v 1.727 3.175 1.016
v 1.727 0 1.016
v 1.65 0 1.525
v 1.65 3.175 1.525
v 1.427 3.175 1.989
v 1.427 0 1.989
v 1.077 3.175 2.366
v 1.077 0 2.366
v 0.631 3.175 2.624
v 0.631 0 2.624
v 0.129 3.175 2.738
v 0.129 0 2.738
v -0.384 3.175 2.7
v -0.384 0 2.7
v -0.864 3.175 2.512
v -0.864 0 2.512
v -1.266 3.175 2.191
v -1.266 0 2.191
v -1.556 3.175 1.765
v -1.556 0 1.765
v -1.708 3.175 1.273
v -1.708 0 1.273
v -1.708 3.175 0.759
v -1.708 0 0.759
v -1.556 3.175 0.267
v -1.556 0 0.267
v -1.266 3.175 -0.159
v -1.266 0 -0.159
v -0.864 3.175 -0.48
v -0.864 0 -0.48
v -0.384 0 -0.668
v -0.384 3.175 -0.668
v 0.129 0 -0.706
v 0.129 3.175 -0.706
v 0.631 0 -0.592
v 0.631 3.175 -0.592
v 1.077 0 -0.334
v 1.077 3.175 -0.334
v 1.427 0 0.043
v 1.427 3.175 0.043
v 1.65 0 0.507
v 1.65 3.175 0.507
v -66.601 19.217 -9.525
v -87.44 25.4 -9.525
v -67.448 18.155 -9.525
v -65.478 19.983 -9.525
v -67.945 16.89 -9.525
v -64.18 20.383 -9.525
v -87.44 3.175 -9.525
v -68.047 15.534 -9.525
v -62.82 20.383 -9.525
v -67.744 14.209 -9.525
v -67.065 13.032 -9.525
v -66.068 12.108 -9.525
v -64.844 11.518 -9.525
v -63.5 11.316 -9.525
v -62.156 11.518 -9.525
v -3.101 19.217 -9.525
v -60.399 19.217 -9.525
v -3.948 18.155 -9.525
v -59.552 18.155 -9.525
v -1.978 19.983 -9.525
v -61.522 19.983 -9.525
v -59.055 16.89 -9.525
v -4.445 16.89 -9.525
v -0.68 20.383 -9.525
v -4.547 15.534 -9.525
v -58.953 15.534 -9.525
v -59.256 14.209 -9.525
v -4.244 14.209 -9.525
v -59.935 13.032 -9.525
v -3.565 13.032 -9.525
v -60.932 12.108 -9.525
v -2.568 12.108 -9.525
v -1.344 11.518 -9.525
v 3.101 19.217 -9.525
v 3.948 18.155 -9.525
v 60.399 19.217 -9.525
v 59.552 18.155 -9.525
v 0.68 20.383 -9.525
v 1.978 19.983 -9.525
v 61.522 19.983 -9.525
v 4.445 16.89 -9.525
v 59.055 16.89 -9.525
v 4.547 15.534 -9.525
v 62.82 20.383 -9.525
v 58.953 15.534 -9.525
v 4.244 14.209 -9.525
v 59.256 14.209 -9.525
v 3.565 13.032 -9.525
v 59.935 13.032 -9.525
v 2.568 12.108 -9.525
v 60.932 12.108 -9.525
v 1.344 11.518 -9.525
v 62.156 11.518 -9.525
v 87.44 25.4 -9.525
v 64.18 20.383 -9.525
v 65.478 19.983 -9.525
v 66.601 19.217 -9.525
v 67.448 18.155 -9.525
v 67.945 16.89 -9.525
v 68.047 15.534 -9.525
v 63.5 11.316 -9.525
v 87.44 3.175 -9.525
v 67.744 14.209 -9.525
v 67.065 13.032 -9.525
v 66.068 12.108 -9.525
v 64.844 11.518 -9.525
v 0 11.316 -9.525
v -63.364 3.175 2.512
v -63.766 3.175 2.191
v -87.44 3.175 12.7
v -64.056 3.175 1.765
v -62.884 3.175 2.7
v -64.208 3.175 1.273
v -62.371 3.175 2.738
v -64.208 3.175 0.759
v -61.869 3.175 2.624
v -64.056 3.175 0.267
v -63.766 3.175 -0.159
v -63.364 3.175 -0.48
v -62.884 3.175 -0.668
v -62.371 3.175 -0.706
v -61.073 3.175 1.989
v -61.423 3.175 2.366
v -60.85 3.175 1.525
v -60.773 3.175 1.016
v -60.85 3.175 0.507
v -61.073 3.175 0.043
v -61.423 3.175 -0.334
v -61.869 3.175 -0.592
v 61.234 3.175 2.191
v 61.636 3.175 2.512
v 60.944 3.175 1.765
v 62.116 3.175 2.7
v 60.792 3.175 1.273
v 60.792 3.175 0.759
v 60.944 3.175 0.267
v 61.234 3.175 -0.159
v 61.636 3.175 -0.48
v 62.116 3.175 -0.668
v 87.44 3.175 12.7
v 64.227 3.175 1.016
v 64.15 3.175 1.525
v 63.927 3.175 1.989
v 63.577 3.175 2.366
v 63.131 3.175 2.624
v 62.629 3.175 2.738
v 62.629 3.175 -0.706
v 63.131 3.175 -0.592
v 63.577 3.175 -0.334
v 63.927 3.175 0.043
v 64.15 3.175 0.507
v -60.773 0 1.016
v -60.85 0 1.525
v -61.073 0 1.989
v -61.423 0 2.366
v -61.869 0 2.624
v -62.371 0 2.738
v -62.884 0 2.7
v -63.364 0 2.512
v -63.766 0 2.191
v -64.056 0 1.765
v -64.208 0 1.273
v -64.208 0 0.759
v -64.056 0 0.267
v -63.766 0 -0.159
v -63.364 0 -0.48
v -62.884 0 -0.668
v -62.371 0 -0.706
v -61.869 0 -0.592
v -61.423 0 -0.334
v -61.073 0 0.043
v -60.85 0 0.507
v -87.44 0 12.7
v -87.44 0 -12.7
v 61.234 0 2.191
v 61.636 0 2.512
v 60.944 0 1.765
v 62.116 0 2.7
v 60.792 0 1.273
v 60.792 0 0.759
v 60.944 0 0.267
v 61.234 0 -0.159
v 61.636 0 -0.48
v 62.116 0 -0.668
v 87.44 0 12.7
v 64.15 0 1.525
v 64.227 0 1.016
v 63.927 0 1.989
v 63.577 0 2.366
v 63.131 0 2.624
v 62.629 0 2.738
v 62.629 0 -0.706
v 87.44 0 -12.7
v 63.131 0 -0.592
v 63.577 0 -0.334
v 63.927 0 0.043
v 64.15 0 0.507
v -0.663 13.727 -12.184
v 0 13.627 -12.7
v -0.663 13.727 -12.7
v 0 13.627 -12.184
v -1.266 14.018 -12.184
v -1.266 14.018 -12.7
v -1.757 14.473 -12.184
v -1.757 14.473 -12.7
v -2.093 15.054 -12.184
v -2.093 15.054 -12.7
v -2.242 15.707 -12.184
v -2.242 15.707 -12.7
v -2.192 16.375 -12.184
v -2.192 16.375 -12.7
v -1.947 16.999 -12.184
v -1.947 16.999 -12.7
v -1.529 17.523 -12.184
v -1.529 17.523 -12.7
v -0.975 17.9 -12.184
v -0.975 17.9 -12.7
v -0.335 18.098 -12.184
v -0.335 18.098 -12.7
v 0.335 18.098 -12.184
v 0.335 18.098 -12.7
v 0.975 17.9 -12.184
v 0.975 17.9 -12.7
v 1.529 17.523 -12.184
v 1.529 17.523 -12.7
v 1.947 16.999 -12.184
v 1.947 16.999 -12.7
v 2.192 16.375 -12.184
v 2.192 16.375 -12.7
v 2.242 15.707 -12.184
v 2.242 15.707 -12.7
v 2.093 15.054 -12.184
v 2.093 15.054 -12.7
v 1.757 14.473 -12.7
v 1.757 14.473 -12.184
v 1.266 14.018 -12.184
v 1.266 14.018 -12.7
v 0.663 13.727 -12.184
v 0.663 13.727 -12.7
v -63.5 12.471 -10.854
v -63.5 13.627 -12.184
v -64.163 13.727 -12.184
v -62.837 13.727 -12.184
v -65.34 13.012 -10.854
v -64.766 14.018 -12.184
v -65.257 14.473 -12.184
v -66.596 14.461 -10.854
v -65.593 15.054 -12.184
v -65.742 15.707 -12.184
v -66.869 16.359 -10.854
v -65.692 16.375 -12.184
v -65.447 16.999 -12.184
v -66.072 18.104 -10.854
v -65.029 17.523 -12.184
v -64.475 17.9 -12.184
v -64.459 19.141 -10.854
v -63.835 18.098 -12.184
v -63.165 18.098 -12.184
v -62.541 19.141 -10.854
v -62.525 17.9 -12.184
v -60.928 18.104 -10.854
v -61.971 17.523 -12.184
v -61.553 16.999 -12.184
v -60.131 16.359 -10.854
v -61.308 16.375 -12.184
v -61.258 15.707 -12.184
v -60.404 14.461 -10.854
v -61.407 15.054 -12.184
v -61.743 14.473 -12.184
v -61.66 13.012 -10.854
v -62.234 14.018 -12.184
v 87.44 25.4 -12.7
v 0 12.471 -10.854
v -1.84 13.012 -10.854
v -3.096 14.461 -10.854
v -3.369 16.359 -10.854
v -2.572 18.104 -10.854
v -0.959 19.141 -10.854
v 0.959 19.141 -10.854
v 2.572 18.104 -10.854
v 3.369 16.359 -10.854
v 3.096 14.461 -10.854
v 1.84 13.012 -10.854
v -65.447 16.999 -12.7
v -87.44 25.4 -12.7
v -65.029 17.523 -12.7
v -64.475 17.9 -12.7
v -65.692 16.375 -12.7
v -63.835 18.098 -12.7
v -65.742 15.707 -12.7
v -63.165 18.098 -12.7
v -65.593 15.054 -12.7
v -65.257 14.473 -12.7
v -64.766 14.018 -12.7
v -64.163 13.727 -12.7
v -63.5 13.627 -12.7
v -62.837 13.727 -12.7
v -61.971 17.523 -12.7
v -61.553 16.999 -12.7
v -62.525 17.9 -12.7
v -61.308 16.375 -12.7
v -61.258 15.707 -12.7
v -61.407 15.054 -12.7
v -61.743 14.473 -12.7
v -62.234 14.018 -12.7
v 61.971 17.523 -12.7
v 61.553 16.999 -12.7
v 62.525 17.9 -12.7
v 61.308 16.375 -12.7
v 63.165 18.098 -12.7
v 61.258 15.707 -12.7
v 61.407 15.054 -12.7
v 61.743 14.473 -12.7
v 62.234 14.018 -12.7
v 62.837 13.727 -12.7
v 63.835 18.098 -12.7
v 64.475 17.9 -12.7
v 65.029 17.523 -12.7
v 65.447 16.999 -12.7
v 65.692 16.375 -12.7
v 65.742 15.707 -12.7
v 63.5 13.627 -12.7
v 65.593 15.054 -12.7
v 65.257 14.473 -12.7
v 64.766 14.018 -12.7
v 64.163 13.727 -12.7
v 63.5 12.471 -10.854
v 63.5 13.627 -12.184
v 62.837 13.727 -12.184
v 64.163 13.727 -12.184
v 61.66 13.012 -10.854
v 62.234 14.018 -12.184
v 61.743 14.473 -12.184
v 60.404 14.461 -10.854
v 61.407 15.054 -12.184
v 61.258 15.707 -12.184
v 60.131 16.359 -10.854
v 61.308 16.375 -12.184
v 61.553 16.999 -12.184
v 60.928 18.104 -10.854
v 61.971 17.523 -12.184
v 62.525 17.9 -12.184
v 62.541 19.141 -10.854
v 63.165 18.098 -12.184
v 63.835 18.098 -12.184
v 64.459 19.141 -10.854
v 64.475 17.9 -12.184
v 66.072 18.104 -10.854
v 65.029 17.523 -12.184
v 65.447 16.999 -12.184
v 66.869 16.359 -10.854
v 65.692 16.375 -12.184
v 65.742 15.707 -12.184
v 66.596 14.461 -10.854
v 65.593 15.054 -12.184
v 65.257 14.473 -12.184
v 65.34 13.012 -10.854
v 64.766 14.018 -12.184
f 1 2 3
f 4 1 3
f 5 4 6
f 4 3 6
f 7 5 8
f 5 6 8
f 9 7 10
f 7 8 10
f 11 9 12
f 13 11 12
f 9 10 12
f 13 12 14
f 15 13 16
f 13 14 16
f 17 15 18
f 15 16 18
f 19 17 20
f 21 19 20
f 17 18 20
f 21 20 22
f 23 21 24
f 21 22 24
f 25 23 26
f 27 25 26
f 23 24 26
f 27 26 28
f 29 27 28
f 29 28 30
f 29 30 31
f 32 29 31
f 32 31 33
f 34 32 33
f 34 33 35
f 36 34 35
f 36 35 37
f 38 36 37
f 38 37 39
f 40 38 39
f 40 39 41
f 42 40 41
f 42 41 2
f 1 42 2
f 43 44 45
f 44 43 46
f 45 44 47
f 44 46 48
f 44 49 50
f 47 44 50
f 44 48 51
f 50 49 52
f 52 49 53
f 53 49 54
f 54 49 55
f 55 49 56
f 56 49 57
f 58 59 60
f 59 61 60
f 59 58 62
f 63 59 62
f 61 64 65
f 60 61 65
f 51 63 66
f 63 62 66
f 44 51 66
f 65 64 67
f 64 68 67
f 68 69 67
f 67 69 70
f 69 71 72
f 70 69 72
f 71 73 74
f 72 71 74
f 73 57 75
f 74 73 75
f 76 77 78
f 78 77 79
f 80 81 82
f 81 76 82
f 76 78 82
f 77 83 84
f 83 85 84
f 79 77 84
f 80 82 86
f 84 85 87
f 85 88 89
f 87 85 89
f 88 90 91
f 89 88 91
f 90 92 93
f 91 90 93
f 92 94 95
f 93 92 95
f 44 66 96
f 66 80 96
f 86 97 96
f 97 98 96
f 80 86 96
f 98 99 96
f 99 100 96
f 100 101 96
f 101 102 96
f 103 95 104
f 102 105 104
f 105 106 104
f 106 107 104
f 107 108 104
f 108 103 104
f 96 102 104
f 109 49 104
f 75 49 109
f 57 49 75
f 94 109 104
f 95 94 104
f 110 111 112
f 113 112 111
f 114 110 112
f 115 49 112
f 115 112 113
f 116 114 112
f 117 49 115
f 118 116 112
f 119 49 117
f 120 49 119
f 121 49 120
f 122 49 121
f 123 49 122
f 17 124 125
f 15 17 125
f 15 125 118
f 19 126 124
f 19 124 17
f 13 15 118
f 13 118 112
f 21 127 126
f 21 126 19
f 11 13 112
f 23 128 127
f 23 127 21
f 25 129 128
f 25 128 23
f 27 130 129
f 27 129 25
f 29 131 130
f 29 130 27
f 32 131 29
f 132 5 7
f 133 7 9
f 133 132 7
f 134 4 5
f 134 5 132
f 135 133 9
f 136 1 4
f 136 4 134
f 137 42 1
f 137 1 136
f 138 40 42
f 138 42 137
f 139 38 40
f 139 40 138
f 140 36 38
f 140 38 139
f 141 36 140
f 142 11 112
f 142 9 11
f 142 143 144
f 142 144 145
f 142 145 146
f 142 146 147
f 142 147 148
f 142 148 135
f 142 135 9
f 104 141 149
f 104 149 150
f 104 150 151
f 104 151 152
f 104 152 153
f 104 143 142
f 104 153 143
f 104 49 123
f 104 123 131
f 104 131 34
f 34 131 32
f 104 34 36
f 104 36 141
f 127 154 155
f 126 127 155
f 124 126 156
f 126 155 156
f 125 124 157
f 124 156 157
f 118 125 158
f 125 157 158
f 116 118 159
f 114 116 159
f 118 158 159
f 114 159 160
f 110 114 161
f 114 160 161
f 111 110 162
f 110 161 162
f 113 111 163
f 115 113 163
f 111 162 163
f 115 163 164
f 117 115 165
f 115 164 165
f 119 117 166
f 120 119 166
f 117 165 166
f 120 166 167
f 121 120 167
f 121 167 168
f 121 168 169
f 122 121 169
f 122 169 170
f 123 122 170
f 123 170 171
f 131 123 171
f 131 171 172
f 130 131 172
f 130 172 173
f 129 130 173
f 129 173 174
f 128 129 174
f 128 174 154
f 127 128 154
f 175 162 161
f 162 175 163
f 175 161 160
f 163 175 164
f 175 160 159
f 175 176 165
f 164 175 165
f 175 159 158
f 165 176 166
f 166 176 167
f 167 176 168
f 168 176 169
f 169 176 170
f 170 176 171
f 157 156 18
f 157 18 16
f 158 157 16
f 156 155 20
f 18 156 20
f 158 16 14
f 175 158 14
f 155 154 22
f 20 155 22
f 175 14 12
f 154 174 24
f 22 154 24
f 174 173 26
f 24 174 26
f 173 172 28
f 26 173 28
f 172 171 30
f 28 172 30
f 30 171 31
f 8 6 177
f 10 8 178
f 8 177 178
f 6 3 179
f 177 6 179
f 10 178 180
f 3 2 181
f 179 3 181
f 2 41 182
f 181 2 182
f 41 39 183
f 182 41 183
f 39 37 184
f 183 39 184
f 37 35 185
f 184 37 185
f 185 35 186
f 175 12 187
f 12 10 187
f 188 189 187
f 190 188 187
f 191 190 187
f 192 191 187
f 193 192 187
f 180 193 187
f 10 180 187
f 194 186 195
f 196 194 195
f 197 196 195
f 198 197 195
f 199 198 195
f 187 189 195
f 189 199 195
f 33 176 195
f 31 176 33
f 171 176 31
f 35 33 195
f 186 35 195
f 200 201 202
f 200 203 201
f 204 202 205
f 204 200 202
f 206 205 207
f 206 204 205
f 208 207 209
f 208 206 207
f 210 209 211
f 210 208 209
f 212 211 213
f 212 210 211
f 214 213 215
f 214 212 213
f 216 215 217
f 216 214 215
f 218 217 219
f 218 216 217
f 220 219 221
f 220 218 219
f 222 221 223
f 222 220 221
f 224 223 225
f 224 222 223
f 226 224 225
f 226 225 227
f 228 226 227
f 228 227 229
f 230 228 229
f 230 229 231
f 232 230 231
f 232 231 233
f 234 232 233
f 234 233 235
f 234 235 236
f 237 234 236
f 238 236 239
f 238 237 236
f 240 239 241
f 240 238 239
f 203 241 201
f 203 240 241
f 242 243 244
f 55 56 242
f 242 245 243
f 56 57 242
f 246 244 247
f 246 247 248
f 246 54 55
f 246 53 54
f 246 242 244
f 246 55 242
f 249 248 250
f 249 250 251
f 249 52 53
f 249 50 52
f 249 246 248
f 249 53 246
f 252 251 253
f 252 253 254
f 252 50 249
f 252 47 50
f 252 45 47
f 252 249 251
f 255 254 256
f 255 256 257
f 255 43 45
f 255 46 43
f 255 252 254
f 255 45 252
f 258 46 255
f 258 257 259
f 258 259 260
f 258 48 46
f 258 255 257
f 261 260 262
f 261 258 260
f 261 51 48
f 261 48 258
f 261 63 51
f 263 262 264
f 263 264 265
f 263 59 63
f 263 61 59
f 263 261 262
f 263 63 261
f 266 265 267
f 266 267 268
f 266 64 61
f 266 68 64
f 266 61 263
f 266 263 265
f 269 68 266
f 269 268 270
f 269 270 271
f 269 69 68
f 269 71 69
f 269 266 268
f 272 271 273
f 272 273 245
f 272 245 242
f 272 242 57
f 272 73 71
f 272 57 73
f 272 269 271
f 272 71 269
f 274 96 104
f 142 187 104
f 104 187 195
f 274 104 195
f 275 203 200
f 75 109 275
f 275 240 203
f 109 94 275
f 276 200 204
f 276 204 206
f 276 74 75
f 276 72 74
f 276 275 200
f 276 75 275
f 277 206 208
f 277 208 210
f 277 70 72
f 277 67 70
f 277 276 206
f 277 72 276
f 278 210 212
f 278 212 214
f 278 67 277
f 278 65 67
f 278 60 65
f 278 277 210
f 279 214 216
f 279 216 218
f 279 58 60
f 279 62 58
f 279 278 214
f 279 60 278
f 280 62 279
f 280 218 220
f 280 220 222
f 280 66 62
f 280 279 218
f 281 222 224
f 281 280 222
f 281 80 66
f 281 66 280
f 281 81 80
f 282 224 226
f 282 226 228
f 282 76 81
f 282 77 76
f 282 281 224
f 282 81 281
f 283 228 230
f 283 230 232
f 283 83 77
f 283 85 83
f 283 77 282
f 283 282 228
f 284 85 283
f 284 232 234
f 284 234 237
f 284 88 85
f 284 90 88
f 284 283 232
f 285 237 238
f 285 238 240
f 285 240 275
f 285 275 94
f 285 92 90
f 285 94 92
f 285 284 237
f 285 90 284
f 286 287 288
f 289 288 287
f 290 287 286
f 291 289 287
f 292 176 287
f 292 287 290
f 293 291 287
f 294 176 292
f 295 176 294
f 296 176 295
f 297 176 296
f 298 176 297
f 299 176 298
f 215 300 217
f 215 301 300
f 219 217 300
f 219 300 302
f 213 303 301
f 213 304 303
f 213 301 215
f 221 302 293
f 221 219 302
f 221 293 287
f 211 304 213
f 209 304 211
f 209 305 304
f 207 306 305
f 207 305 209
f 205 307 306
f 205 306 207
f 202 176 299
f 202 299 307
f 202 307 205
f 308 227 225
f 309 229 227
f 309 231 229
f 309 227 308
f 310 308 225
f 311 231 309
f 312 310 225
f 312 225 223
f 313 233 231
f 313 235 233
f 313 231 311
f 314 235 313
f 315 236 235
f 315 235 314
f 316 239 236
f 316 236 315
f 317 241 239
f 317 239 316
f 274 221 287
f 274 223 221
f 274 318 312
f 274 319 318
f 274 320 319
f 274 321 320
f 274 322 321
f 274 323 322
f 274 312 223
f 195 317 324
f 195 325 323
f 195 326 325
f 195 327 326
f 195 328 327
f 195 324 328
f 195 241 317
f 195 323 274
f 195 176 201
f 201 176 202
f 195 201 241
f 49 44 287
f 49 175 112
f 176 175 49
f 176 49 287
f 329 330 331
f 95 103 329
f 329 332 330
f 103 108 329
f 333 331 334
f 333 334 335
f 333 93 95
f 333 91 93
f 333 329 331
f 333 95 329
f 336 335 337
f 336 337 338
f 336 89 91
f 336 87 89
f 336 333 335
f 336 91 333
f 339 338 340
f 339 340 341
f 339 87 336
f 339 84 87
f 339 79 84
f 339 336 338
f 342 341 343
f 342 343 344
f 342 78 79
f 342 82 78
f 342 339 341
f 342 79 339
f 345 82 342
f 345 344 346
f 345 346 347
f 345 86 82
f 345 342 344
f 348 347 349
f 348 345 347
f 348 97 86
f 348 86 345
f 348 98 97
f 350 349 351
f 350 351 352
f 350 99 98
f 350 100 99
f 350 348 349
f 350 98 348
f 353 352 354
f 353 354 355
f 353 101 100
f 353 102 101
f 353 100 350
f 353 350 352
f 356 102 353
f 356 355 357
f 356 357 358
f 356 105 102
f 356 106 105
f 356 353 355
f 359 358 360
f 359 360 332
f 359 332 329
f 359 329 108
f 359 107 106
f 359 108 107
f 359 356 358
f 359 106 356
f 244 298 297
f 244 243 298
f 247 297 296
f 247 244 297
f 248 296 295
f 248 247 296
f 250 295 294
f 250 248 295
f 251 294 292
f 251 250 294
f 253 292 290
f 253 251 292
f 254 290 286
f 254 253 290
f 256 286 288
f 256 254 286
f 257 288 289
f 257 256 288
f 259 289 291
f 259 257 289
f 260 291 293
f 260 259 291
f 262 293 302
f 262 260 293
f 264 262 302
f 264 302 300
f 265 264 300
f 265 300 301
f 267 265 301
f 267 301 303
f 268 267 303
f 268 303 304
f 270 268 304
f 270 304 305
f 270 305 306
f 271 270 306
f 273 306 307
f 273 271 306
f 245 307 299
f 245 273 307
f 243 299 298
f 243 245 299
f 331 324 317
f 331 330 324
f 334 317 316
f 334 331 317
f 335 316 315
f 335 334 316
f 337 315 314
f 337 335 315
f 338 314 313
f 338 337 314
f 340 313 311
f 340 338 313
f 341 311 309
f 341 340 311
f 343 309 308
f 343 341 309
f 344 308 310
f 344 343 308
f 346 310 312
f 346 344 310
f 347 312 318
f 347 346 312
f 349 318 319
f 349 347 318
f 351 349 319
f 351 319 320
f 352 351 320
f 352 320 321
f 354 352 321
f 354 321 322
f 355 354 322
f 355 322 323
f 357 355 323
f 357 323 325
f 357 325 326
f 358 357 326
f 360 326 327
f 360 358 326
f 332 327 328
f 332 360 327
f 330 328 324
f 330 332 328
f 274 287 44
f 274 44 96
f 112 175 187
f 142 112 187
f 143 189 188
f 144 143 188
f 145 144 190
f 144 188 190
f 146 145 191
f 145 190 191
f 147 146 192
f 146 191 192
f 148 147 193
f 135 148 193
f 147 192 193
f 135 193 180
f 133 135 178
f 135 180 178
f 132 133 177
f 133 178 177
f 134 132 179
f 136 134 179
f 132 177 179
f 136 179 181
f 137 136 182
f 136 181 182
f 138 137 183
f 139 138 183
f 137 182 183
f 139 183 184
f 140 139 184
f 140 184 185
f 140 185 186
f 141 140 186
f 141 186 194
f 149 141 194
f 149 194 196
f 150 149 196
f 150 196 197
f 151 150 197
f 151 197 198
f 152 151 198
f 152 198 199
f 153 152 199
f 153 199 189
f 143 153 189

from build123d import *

# Parameters (mm, degrees)
SKETCH1_W                                     = 174.879
SKETCH1_H                                     = 25.4
BOSS_EXTRUDE1_DEPTH                           = 3.175
SKETCH2_W                                     = 174.879
SKETCH2_H                                     = 3.175
BOSS_EXTRUDE2_DEPTH                           = 22.225
F_8_32_TAPPED_HOLE1_D                         = 3.4544
F_8_32_TAPPED_HOLE1_DEPTH                     = 10.668
F_8_32_TAPPED_HOLE1_TIP                       = 1.037806461
CSK_FOR_8_FLAT_HEAD_SOCKET_CAP_SCREW1_A_COUNT = 2
CSK_FOR_8_FLAT_HEAD_SOCKET_CAP_SCREW1_A_PITCH = 63.5
CSK_FOR_8_FLAT_HEAD_SOCKET_CAP_SCRE_2_COUNT   = 2
CSK_FOR_8_FLAT_HEAD_SOCKET_CAP_SCRE_2_PITCH   = 127


with BuildPart() as part:
    # Sketch1 → Boss-Extrude1 (new body)
    with BuildSketch(Plane(origin=(0, 0, 0), x_dir=(1, 0, 0), z_dir=(0, 1, 0))):
        Rectangle(SKETCH1_W, SKETCH1_H)
    extrude(amount=BOSS_EXTRUDE1_DEPTH)

    # Sketch2 → Boss-Extrude2 (add)
    with BuildSketch(Plane(origin=(0, 3.175, 0), x_dir=(1, 0, 0), z_dir=(0, 1, 0))):
        with Locations((0, 11.1125)):
            Rectangle(SKETCH2_W, SKETCH2_H)
    extrude(amount=BOSS_EXTRUDE2_DEPTH)

    # #8-32 Tapped Hole1
    with Locations(Plane(origin=(0, 3.175, 0), x_dir=(-1, 0, 0), z_dir=(0, 1, 0))):
        with Locations((62.5, 1.016), (0, 1.016), (-62.5, 1.016)):
            Hole(F_8_32_TAPPED_HOLE1_D / 2, depth=F_8_32_TAPPED_HOLE1_DEPTH)
            with Locations((0, 0, -(F_8_32_TAPPED_HOLE1_DEPTH + F_8_32_TAPPED_HOLE1_TIP / 2))):  # 118° drill point
                Cone(0, F_8_32_TAPPED_HOLE1_D / 2, F_8_32_TAPPED_HOLE1_TIP, mode=Mode.SUBTRACT)

    # Sketch6 → CSK for #8 Flat Head Socket Cap Screw1 (revolve, cut)
    with BuildSketch(Plane(origin=(-63.5, 15.875, -9.525), x_dir=(0, -1, 0), z_dir=(1, 0, 0))):
        Polygon((0, 0), (0, 3.175), (2.2479, 3.175), (2.2479, 2.658961536), (4.5593, 0), align=None)
    csk_for_8_flat_head_socket_cap_screw1 = revolve(axis=Axis((-63.5, 15.875, -3.175), (0, 0, -1)), mode=Mode.SUBTRACT)

    # CSK for #8 Flat Head Socket Cap Screw1 a: CSK for #8 Flat Head Socket Cap Screw1 ×2
    with Locations(*[(i * CSK_FOR_8_FLAT_HEAD_SOCKET_CAP_SCREW1_A_PITCH, 0, 0) for i in range(1, CSK_FOR_8_FLAT_HEAD_SOCKET_CAP_SCREW1_A_COUNT)]):
        add(csk_for_8_flat_head_socket_cap_screw1, mode=Mode.SUBTRACT)

    # CSK for _8 Flat Head Socket Cap Scre 2: CSK for #8 Flat Head Socket Cap Screw1 ×2
    with Locations(*[(i * CSK_FOR_8_FLAT_HEAD_SOCKET_CAP_SCRE_2_PITCH, 0, 0) for i in range(1, CSK_FOR_8_FLAT_HEAD_SOCKET_CAP_SCRE_2_COUNT)]):
        add(csk_for_8_flat_head_socket_cap_screw1, mode=Mode.SUBTRACT)


solid = part.part
